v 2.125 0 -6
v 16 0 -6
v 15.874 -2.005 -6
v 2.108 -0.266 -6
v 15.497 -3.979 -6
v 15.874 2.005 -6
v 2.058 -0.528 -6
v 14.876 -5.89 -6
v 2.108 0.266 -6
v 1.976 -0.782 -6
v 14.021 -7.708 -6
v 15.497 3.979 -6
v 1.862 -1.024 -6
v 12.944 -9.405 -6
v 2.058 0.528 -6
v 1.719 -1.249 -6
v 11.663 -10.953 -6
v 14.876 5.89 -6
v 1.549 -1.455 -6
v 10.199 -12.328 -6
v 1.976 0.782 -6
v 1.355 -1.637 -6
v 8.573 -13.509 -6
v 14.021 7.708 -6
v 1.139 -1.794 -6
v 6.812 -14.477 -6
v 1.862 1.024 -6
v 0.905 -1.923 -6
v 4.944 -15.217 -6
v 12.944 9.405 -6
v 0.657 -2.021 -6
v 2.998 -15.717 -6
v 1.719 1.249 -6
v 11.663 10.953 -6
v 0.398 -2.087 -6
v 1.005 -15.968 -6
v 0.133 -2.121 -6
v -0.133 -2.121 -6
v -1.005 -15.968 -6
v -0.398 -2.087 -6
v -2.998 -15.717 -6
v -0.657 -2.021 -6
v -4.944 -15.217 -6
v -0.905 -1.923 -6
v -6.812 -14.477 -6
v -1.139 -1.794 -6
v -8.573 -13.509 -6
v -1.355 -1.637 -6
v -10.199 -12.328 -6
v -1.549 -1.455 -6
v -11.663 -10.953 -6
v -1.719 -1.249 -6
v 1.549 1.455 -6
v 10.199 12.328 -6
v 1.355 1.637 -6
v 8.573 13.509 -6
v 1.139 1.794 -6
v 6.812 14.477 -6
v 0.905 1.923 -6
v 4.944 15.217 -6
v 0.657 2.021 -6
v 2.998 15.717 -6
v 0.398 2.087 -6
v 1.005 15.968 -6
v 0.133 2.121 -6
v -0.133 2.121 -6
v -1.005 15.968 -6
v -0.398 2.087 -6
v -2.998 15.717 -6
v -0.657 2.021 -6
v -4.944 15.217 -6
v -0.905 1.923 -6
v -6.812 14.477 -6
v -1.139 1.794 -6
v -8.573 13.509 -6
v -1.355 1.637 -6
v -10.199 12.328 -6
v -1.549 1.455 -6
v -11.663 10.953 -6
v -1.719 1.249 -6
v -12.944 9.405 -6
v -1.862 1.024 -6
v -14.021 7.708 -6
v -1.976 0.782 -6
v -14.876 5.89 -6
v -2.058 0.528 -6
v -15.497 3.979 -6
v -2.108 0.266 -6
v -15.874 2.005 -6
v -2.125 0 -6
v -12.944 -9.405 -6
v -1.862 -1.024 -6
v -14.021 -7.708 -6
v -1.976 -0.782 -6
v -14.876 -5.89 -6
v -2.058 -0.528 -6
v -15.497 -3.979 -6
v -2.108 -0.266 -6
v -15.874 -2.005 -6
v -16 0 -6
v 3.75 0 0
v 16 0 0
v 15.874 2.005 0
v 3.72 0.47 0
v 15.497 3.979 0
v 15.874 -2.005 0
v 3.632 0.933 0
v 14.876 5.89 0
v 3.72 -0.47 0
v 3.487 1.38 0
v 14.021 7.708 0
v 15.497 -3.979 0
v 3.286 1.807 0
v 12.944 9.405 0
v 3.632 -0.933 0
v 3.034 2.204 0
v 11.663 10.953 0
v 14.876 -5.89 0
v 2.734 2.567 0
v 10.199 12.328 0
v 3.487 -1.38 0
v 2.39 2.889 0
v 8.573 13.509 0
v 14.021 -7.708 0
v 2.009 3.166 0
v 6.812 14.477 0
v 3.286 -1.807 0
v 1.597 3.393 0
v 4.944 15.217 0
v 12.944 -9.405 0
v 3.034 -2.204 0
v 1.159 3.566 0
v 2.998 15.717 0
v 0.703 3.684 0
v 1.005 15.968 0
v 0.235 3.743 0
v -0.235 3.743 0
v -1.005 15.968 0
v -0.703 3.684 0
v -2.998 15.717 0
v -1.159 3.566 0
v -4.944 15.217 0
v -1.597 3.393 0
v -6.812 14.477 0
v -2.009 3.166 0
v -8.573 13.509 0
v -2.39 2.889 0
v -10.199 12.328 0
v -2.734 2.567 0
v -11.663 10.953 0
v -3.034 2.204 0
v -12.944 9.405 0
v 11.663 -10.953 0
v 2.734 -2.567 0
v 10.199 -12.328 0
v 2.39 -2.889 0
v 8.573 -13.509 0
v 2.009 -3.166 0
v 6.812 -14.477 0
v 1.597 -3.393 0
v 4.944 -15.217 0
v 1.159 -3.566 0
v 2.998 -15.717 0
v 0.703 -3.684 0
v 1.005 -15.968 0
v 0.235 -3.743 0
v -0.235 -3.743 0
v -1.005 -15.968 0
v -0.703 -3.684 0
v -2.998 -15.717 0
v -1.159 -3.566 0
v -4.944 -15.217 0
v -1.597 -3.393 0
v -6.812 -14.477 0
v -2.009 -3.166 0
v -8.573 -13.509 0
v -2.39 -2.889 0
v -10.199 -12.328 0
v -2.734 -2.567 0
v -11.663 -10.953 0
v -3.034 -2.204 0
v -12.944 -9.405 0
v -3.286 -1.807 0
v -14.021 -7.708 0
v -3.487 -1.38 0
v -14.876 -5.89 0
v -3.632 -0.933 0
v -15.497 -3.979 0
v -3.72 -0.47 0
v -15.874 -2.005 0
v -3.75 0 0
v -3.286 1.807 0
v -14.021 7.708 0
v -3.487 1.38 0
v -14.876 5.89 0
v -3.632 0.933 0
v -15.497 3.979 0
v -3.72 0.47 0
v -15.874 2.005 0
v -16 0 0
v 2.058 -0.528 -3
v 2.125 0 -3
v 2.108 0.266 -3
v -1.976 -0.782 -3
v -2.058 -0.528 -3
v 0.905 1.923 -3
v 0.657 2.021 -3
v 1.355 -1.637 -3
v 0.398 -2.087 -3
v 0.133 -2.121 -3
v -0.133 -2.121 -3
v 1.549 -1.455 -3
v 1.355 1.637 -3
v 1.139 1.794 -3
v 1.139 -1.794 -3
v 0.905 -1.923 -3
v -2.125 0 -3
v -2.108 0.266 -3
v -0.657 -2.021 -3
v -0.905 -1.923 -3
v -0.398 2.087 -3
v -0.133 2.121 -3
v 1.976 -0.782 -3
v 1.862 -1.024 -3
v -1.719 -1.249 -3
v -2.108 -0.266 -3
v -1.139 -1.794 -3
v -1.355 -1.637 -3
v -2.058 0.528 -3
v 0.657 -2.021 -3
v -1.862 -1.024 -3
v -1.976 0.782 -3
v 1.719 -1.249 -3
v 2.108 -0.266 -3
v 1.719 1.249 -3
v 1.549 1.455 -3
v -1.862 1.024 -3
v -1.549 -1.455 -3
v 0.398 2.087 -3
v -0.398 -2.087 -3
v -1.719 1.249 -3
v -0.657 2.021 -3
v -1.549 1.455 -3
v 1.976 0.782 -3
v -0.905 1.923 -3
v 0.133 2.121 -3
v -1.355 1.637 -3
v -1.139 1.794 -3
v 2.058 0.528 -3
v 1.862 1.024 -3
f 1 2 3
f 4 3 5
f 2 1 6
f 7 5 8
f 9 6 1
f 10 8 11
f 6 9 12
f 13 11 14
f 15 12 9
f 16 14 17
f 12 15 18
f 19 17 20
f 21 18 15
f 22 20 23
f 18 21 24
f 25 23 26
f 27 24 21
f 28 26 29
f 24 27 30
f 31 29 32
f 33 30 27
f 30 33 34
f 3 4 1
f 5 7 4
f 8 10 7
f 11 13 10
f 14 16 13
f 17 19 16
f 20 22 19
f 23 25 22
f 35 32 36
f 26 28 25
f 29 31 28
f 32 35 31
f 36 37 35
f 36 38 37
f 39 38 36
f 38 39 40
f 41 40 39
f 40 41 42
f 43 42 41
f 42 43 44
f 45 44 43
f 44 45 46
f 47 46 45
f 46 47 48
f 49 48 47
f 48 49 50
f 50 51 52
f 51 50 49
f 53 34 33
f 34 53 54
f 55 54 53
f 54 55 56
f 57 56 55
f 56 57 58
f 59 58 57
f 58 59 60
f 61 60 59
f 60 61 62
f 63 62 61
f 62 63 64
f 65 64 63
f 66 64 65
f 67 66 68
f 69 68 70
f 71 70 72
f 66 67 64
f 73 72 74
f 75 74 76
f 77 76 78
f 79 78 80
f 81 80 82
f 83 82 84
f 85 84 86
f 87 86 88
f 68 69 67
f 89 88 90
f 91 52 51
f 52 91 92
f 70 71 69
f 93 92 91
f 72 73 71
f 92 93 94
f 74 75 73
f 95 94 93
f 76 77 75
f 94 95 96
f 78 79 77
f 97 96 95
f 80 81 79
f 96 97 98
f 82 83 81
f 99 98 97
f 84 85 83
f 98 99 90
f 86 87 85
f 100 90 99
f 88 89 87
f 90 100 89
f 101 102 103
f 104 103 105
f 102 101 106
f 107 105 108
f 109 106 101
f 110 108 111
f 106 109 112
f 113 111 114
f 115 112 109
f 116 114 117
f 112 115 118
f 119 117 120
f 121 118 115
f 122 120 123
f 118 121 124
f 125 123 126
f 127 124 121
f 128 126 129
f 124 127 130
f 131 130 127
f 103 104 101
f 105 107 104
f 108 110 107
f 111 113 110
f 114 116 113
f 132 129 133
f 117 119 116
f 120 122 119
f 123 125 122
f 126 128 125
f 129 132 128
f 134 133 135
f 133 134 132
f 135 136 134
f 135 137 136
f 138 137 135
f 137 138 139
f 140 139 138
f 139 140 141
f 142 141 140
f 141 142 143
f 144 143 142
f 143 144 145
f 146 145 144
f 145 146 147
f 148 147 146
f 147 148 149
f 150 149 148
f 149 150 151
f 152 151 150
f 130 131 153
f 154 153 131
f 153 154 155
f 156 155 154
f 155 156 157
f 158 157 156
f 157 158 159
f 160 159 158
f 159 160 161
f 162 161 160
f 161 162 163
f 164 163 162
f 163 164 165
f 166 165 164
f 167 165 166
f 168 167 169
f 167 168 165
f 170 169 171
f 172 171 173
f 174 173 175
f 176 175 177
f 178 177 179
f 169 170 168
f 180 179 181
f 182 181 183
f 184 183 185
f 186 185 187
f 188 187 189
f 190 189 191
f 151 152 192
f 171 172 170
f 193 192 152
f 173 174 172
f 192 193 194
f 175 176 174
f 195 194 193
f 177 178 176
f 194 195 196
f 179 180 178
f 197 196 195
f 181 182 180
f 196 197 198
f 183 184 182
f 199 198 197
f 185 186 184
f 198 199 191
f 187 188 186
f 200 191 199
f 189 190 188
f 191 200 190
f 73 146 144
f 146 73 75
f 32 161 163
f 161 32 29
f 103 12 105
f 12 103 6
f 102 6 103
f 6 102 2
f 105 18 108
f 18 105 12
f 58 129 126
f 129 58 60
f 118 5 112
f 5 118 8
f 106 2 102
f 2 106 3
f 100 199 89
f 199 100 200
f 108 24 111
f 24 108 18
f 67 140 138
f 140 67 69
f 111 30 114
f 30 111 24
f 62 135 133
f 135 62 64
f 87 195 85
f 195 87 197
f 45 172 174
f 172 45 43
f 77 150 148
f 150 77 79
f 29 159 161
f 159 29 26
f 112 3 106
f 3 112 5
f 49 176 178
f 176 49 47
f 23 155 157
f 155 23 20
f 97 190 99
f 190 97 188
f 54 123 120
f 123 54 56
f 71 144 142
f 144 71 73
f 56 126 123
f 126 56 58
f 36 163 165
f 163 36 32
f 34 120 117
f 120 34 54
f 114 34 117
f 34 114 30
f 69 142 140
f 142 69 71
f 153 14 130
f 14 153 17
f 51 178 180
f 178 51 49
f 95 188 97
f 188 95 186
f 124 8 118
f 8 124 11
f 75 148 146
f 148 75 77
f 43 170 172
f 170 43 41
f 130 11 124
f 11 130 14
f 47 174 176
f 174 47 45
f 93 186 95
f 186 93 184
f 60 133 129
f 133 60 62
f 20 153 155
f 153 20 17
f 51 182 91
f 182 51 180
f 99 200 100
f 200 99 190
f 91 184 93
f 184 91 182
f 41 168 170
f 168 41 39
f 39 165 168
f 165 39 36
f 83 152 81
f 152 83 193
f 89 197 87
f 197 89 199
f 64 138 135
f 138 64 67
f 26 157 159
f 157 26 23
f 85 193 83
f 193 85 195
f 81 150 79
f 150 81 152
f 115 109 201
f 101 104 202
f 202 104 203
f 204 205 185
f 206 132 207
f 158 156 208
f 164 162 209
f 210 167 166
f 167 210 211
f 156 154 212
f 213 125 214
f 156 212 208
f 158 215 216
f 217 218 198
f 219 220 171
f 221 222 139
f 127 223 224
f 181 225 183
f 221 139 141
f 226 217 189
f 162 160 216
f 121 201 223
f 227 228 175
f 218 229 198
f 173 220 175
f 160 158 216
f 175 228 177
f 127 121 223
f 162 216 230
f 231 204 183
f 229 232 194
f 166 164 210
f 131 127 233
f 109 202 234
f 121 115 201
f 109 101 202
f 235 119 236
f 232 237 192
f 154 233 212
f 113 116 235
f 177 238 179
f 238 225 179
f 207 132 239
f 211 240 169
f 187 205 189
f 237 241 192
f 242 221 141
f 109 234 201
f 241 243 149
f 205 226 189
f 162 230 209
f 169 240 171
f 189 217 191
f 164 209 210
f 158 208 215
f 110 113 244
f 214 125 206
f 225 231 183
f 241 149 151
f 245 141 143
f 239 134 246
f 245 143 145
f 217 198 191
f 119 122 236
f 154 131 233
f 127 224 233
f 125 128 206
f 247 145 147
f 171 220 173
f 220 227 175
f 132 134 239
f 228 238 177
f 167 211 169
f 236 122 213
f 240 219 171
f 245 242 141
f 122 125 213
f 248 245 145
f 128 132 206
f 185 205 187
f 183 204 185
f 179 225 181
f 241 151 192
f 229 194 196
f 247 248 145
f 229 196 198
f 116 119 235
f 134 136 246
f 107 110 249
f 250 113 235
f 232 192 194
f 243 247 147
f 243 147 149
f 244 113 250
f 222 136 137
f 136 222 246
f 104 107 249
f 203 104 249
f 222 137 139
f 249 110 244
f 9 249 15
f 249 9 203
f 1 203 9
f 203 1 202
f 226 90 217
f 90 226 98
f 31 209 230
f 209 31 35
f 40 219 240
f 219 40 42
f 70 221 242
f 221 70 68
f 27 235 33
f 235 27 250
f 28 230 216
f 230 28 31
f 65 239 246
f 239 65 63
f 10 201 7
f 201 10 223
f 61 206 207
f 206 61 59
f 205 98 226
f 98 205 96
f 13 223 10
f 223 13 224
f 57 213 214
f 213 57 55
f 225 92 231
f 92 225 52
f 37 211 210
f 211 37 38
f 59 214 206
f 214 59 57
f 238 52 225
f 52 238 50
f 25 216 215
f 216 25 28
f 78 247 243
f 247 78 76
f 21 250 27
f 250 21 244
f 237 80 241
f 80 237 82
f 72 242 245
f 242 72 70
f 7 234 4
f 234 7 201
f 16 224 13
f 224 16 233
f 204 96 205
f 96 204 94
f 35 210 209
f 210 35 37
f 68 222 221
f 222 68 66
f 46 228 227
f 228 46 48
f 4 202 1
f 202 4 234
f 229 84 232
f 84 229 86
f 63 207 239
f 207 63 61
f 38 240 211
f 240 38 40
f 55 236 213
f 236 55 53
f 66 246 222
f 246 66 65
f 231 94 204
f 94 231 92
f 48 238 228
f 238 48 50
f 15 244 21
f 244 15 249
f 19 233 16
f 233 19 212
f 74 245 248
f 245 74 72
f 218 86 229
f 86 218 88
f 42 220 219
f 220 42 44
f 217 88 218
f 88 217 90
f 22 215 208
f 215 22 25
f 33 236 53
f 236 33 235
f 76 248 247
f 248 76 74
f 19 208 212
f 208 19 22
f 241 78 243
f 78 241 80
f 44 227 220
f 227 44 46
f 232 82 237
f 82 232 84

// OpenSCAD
$fn = 50;


difference() {
	union() {
		translate(v = [0, 0, -6.0000000000]) {
			cylinder(h = 6, r = 7.0000000000);
		}
		translate(v = [0, 0, -6.0000000000]) {
			cylinder(h = 6, r = 16.0000000000);
		}
	}
	union() {
		translate(v = [0, 0, 0]) {
			rotate(a = [0, 0, 0]) {
				difference() {
					union() {
						#translate(v = [0, 0, -6.0000000000]) {
							cylinder(h = 6, r = 2.0000000000);
						}
						#translate(v = [0, 0, -3]) {
							cylinder(h = 3, r1 = 2.1250000000, r2 = 3.7500000000);
						}
						#translate(v = [0, 0, -6.0000000000]) {
							cylinder(h = 6, r = 2.1250000000);
						}
						#translate(v = [0, 0, -6.0000000000]) {
							cylinder(h = 6, r = 2.0000000000);
						}
					}
					union();
				}
			}
		}
	}
}
